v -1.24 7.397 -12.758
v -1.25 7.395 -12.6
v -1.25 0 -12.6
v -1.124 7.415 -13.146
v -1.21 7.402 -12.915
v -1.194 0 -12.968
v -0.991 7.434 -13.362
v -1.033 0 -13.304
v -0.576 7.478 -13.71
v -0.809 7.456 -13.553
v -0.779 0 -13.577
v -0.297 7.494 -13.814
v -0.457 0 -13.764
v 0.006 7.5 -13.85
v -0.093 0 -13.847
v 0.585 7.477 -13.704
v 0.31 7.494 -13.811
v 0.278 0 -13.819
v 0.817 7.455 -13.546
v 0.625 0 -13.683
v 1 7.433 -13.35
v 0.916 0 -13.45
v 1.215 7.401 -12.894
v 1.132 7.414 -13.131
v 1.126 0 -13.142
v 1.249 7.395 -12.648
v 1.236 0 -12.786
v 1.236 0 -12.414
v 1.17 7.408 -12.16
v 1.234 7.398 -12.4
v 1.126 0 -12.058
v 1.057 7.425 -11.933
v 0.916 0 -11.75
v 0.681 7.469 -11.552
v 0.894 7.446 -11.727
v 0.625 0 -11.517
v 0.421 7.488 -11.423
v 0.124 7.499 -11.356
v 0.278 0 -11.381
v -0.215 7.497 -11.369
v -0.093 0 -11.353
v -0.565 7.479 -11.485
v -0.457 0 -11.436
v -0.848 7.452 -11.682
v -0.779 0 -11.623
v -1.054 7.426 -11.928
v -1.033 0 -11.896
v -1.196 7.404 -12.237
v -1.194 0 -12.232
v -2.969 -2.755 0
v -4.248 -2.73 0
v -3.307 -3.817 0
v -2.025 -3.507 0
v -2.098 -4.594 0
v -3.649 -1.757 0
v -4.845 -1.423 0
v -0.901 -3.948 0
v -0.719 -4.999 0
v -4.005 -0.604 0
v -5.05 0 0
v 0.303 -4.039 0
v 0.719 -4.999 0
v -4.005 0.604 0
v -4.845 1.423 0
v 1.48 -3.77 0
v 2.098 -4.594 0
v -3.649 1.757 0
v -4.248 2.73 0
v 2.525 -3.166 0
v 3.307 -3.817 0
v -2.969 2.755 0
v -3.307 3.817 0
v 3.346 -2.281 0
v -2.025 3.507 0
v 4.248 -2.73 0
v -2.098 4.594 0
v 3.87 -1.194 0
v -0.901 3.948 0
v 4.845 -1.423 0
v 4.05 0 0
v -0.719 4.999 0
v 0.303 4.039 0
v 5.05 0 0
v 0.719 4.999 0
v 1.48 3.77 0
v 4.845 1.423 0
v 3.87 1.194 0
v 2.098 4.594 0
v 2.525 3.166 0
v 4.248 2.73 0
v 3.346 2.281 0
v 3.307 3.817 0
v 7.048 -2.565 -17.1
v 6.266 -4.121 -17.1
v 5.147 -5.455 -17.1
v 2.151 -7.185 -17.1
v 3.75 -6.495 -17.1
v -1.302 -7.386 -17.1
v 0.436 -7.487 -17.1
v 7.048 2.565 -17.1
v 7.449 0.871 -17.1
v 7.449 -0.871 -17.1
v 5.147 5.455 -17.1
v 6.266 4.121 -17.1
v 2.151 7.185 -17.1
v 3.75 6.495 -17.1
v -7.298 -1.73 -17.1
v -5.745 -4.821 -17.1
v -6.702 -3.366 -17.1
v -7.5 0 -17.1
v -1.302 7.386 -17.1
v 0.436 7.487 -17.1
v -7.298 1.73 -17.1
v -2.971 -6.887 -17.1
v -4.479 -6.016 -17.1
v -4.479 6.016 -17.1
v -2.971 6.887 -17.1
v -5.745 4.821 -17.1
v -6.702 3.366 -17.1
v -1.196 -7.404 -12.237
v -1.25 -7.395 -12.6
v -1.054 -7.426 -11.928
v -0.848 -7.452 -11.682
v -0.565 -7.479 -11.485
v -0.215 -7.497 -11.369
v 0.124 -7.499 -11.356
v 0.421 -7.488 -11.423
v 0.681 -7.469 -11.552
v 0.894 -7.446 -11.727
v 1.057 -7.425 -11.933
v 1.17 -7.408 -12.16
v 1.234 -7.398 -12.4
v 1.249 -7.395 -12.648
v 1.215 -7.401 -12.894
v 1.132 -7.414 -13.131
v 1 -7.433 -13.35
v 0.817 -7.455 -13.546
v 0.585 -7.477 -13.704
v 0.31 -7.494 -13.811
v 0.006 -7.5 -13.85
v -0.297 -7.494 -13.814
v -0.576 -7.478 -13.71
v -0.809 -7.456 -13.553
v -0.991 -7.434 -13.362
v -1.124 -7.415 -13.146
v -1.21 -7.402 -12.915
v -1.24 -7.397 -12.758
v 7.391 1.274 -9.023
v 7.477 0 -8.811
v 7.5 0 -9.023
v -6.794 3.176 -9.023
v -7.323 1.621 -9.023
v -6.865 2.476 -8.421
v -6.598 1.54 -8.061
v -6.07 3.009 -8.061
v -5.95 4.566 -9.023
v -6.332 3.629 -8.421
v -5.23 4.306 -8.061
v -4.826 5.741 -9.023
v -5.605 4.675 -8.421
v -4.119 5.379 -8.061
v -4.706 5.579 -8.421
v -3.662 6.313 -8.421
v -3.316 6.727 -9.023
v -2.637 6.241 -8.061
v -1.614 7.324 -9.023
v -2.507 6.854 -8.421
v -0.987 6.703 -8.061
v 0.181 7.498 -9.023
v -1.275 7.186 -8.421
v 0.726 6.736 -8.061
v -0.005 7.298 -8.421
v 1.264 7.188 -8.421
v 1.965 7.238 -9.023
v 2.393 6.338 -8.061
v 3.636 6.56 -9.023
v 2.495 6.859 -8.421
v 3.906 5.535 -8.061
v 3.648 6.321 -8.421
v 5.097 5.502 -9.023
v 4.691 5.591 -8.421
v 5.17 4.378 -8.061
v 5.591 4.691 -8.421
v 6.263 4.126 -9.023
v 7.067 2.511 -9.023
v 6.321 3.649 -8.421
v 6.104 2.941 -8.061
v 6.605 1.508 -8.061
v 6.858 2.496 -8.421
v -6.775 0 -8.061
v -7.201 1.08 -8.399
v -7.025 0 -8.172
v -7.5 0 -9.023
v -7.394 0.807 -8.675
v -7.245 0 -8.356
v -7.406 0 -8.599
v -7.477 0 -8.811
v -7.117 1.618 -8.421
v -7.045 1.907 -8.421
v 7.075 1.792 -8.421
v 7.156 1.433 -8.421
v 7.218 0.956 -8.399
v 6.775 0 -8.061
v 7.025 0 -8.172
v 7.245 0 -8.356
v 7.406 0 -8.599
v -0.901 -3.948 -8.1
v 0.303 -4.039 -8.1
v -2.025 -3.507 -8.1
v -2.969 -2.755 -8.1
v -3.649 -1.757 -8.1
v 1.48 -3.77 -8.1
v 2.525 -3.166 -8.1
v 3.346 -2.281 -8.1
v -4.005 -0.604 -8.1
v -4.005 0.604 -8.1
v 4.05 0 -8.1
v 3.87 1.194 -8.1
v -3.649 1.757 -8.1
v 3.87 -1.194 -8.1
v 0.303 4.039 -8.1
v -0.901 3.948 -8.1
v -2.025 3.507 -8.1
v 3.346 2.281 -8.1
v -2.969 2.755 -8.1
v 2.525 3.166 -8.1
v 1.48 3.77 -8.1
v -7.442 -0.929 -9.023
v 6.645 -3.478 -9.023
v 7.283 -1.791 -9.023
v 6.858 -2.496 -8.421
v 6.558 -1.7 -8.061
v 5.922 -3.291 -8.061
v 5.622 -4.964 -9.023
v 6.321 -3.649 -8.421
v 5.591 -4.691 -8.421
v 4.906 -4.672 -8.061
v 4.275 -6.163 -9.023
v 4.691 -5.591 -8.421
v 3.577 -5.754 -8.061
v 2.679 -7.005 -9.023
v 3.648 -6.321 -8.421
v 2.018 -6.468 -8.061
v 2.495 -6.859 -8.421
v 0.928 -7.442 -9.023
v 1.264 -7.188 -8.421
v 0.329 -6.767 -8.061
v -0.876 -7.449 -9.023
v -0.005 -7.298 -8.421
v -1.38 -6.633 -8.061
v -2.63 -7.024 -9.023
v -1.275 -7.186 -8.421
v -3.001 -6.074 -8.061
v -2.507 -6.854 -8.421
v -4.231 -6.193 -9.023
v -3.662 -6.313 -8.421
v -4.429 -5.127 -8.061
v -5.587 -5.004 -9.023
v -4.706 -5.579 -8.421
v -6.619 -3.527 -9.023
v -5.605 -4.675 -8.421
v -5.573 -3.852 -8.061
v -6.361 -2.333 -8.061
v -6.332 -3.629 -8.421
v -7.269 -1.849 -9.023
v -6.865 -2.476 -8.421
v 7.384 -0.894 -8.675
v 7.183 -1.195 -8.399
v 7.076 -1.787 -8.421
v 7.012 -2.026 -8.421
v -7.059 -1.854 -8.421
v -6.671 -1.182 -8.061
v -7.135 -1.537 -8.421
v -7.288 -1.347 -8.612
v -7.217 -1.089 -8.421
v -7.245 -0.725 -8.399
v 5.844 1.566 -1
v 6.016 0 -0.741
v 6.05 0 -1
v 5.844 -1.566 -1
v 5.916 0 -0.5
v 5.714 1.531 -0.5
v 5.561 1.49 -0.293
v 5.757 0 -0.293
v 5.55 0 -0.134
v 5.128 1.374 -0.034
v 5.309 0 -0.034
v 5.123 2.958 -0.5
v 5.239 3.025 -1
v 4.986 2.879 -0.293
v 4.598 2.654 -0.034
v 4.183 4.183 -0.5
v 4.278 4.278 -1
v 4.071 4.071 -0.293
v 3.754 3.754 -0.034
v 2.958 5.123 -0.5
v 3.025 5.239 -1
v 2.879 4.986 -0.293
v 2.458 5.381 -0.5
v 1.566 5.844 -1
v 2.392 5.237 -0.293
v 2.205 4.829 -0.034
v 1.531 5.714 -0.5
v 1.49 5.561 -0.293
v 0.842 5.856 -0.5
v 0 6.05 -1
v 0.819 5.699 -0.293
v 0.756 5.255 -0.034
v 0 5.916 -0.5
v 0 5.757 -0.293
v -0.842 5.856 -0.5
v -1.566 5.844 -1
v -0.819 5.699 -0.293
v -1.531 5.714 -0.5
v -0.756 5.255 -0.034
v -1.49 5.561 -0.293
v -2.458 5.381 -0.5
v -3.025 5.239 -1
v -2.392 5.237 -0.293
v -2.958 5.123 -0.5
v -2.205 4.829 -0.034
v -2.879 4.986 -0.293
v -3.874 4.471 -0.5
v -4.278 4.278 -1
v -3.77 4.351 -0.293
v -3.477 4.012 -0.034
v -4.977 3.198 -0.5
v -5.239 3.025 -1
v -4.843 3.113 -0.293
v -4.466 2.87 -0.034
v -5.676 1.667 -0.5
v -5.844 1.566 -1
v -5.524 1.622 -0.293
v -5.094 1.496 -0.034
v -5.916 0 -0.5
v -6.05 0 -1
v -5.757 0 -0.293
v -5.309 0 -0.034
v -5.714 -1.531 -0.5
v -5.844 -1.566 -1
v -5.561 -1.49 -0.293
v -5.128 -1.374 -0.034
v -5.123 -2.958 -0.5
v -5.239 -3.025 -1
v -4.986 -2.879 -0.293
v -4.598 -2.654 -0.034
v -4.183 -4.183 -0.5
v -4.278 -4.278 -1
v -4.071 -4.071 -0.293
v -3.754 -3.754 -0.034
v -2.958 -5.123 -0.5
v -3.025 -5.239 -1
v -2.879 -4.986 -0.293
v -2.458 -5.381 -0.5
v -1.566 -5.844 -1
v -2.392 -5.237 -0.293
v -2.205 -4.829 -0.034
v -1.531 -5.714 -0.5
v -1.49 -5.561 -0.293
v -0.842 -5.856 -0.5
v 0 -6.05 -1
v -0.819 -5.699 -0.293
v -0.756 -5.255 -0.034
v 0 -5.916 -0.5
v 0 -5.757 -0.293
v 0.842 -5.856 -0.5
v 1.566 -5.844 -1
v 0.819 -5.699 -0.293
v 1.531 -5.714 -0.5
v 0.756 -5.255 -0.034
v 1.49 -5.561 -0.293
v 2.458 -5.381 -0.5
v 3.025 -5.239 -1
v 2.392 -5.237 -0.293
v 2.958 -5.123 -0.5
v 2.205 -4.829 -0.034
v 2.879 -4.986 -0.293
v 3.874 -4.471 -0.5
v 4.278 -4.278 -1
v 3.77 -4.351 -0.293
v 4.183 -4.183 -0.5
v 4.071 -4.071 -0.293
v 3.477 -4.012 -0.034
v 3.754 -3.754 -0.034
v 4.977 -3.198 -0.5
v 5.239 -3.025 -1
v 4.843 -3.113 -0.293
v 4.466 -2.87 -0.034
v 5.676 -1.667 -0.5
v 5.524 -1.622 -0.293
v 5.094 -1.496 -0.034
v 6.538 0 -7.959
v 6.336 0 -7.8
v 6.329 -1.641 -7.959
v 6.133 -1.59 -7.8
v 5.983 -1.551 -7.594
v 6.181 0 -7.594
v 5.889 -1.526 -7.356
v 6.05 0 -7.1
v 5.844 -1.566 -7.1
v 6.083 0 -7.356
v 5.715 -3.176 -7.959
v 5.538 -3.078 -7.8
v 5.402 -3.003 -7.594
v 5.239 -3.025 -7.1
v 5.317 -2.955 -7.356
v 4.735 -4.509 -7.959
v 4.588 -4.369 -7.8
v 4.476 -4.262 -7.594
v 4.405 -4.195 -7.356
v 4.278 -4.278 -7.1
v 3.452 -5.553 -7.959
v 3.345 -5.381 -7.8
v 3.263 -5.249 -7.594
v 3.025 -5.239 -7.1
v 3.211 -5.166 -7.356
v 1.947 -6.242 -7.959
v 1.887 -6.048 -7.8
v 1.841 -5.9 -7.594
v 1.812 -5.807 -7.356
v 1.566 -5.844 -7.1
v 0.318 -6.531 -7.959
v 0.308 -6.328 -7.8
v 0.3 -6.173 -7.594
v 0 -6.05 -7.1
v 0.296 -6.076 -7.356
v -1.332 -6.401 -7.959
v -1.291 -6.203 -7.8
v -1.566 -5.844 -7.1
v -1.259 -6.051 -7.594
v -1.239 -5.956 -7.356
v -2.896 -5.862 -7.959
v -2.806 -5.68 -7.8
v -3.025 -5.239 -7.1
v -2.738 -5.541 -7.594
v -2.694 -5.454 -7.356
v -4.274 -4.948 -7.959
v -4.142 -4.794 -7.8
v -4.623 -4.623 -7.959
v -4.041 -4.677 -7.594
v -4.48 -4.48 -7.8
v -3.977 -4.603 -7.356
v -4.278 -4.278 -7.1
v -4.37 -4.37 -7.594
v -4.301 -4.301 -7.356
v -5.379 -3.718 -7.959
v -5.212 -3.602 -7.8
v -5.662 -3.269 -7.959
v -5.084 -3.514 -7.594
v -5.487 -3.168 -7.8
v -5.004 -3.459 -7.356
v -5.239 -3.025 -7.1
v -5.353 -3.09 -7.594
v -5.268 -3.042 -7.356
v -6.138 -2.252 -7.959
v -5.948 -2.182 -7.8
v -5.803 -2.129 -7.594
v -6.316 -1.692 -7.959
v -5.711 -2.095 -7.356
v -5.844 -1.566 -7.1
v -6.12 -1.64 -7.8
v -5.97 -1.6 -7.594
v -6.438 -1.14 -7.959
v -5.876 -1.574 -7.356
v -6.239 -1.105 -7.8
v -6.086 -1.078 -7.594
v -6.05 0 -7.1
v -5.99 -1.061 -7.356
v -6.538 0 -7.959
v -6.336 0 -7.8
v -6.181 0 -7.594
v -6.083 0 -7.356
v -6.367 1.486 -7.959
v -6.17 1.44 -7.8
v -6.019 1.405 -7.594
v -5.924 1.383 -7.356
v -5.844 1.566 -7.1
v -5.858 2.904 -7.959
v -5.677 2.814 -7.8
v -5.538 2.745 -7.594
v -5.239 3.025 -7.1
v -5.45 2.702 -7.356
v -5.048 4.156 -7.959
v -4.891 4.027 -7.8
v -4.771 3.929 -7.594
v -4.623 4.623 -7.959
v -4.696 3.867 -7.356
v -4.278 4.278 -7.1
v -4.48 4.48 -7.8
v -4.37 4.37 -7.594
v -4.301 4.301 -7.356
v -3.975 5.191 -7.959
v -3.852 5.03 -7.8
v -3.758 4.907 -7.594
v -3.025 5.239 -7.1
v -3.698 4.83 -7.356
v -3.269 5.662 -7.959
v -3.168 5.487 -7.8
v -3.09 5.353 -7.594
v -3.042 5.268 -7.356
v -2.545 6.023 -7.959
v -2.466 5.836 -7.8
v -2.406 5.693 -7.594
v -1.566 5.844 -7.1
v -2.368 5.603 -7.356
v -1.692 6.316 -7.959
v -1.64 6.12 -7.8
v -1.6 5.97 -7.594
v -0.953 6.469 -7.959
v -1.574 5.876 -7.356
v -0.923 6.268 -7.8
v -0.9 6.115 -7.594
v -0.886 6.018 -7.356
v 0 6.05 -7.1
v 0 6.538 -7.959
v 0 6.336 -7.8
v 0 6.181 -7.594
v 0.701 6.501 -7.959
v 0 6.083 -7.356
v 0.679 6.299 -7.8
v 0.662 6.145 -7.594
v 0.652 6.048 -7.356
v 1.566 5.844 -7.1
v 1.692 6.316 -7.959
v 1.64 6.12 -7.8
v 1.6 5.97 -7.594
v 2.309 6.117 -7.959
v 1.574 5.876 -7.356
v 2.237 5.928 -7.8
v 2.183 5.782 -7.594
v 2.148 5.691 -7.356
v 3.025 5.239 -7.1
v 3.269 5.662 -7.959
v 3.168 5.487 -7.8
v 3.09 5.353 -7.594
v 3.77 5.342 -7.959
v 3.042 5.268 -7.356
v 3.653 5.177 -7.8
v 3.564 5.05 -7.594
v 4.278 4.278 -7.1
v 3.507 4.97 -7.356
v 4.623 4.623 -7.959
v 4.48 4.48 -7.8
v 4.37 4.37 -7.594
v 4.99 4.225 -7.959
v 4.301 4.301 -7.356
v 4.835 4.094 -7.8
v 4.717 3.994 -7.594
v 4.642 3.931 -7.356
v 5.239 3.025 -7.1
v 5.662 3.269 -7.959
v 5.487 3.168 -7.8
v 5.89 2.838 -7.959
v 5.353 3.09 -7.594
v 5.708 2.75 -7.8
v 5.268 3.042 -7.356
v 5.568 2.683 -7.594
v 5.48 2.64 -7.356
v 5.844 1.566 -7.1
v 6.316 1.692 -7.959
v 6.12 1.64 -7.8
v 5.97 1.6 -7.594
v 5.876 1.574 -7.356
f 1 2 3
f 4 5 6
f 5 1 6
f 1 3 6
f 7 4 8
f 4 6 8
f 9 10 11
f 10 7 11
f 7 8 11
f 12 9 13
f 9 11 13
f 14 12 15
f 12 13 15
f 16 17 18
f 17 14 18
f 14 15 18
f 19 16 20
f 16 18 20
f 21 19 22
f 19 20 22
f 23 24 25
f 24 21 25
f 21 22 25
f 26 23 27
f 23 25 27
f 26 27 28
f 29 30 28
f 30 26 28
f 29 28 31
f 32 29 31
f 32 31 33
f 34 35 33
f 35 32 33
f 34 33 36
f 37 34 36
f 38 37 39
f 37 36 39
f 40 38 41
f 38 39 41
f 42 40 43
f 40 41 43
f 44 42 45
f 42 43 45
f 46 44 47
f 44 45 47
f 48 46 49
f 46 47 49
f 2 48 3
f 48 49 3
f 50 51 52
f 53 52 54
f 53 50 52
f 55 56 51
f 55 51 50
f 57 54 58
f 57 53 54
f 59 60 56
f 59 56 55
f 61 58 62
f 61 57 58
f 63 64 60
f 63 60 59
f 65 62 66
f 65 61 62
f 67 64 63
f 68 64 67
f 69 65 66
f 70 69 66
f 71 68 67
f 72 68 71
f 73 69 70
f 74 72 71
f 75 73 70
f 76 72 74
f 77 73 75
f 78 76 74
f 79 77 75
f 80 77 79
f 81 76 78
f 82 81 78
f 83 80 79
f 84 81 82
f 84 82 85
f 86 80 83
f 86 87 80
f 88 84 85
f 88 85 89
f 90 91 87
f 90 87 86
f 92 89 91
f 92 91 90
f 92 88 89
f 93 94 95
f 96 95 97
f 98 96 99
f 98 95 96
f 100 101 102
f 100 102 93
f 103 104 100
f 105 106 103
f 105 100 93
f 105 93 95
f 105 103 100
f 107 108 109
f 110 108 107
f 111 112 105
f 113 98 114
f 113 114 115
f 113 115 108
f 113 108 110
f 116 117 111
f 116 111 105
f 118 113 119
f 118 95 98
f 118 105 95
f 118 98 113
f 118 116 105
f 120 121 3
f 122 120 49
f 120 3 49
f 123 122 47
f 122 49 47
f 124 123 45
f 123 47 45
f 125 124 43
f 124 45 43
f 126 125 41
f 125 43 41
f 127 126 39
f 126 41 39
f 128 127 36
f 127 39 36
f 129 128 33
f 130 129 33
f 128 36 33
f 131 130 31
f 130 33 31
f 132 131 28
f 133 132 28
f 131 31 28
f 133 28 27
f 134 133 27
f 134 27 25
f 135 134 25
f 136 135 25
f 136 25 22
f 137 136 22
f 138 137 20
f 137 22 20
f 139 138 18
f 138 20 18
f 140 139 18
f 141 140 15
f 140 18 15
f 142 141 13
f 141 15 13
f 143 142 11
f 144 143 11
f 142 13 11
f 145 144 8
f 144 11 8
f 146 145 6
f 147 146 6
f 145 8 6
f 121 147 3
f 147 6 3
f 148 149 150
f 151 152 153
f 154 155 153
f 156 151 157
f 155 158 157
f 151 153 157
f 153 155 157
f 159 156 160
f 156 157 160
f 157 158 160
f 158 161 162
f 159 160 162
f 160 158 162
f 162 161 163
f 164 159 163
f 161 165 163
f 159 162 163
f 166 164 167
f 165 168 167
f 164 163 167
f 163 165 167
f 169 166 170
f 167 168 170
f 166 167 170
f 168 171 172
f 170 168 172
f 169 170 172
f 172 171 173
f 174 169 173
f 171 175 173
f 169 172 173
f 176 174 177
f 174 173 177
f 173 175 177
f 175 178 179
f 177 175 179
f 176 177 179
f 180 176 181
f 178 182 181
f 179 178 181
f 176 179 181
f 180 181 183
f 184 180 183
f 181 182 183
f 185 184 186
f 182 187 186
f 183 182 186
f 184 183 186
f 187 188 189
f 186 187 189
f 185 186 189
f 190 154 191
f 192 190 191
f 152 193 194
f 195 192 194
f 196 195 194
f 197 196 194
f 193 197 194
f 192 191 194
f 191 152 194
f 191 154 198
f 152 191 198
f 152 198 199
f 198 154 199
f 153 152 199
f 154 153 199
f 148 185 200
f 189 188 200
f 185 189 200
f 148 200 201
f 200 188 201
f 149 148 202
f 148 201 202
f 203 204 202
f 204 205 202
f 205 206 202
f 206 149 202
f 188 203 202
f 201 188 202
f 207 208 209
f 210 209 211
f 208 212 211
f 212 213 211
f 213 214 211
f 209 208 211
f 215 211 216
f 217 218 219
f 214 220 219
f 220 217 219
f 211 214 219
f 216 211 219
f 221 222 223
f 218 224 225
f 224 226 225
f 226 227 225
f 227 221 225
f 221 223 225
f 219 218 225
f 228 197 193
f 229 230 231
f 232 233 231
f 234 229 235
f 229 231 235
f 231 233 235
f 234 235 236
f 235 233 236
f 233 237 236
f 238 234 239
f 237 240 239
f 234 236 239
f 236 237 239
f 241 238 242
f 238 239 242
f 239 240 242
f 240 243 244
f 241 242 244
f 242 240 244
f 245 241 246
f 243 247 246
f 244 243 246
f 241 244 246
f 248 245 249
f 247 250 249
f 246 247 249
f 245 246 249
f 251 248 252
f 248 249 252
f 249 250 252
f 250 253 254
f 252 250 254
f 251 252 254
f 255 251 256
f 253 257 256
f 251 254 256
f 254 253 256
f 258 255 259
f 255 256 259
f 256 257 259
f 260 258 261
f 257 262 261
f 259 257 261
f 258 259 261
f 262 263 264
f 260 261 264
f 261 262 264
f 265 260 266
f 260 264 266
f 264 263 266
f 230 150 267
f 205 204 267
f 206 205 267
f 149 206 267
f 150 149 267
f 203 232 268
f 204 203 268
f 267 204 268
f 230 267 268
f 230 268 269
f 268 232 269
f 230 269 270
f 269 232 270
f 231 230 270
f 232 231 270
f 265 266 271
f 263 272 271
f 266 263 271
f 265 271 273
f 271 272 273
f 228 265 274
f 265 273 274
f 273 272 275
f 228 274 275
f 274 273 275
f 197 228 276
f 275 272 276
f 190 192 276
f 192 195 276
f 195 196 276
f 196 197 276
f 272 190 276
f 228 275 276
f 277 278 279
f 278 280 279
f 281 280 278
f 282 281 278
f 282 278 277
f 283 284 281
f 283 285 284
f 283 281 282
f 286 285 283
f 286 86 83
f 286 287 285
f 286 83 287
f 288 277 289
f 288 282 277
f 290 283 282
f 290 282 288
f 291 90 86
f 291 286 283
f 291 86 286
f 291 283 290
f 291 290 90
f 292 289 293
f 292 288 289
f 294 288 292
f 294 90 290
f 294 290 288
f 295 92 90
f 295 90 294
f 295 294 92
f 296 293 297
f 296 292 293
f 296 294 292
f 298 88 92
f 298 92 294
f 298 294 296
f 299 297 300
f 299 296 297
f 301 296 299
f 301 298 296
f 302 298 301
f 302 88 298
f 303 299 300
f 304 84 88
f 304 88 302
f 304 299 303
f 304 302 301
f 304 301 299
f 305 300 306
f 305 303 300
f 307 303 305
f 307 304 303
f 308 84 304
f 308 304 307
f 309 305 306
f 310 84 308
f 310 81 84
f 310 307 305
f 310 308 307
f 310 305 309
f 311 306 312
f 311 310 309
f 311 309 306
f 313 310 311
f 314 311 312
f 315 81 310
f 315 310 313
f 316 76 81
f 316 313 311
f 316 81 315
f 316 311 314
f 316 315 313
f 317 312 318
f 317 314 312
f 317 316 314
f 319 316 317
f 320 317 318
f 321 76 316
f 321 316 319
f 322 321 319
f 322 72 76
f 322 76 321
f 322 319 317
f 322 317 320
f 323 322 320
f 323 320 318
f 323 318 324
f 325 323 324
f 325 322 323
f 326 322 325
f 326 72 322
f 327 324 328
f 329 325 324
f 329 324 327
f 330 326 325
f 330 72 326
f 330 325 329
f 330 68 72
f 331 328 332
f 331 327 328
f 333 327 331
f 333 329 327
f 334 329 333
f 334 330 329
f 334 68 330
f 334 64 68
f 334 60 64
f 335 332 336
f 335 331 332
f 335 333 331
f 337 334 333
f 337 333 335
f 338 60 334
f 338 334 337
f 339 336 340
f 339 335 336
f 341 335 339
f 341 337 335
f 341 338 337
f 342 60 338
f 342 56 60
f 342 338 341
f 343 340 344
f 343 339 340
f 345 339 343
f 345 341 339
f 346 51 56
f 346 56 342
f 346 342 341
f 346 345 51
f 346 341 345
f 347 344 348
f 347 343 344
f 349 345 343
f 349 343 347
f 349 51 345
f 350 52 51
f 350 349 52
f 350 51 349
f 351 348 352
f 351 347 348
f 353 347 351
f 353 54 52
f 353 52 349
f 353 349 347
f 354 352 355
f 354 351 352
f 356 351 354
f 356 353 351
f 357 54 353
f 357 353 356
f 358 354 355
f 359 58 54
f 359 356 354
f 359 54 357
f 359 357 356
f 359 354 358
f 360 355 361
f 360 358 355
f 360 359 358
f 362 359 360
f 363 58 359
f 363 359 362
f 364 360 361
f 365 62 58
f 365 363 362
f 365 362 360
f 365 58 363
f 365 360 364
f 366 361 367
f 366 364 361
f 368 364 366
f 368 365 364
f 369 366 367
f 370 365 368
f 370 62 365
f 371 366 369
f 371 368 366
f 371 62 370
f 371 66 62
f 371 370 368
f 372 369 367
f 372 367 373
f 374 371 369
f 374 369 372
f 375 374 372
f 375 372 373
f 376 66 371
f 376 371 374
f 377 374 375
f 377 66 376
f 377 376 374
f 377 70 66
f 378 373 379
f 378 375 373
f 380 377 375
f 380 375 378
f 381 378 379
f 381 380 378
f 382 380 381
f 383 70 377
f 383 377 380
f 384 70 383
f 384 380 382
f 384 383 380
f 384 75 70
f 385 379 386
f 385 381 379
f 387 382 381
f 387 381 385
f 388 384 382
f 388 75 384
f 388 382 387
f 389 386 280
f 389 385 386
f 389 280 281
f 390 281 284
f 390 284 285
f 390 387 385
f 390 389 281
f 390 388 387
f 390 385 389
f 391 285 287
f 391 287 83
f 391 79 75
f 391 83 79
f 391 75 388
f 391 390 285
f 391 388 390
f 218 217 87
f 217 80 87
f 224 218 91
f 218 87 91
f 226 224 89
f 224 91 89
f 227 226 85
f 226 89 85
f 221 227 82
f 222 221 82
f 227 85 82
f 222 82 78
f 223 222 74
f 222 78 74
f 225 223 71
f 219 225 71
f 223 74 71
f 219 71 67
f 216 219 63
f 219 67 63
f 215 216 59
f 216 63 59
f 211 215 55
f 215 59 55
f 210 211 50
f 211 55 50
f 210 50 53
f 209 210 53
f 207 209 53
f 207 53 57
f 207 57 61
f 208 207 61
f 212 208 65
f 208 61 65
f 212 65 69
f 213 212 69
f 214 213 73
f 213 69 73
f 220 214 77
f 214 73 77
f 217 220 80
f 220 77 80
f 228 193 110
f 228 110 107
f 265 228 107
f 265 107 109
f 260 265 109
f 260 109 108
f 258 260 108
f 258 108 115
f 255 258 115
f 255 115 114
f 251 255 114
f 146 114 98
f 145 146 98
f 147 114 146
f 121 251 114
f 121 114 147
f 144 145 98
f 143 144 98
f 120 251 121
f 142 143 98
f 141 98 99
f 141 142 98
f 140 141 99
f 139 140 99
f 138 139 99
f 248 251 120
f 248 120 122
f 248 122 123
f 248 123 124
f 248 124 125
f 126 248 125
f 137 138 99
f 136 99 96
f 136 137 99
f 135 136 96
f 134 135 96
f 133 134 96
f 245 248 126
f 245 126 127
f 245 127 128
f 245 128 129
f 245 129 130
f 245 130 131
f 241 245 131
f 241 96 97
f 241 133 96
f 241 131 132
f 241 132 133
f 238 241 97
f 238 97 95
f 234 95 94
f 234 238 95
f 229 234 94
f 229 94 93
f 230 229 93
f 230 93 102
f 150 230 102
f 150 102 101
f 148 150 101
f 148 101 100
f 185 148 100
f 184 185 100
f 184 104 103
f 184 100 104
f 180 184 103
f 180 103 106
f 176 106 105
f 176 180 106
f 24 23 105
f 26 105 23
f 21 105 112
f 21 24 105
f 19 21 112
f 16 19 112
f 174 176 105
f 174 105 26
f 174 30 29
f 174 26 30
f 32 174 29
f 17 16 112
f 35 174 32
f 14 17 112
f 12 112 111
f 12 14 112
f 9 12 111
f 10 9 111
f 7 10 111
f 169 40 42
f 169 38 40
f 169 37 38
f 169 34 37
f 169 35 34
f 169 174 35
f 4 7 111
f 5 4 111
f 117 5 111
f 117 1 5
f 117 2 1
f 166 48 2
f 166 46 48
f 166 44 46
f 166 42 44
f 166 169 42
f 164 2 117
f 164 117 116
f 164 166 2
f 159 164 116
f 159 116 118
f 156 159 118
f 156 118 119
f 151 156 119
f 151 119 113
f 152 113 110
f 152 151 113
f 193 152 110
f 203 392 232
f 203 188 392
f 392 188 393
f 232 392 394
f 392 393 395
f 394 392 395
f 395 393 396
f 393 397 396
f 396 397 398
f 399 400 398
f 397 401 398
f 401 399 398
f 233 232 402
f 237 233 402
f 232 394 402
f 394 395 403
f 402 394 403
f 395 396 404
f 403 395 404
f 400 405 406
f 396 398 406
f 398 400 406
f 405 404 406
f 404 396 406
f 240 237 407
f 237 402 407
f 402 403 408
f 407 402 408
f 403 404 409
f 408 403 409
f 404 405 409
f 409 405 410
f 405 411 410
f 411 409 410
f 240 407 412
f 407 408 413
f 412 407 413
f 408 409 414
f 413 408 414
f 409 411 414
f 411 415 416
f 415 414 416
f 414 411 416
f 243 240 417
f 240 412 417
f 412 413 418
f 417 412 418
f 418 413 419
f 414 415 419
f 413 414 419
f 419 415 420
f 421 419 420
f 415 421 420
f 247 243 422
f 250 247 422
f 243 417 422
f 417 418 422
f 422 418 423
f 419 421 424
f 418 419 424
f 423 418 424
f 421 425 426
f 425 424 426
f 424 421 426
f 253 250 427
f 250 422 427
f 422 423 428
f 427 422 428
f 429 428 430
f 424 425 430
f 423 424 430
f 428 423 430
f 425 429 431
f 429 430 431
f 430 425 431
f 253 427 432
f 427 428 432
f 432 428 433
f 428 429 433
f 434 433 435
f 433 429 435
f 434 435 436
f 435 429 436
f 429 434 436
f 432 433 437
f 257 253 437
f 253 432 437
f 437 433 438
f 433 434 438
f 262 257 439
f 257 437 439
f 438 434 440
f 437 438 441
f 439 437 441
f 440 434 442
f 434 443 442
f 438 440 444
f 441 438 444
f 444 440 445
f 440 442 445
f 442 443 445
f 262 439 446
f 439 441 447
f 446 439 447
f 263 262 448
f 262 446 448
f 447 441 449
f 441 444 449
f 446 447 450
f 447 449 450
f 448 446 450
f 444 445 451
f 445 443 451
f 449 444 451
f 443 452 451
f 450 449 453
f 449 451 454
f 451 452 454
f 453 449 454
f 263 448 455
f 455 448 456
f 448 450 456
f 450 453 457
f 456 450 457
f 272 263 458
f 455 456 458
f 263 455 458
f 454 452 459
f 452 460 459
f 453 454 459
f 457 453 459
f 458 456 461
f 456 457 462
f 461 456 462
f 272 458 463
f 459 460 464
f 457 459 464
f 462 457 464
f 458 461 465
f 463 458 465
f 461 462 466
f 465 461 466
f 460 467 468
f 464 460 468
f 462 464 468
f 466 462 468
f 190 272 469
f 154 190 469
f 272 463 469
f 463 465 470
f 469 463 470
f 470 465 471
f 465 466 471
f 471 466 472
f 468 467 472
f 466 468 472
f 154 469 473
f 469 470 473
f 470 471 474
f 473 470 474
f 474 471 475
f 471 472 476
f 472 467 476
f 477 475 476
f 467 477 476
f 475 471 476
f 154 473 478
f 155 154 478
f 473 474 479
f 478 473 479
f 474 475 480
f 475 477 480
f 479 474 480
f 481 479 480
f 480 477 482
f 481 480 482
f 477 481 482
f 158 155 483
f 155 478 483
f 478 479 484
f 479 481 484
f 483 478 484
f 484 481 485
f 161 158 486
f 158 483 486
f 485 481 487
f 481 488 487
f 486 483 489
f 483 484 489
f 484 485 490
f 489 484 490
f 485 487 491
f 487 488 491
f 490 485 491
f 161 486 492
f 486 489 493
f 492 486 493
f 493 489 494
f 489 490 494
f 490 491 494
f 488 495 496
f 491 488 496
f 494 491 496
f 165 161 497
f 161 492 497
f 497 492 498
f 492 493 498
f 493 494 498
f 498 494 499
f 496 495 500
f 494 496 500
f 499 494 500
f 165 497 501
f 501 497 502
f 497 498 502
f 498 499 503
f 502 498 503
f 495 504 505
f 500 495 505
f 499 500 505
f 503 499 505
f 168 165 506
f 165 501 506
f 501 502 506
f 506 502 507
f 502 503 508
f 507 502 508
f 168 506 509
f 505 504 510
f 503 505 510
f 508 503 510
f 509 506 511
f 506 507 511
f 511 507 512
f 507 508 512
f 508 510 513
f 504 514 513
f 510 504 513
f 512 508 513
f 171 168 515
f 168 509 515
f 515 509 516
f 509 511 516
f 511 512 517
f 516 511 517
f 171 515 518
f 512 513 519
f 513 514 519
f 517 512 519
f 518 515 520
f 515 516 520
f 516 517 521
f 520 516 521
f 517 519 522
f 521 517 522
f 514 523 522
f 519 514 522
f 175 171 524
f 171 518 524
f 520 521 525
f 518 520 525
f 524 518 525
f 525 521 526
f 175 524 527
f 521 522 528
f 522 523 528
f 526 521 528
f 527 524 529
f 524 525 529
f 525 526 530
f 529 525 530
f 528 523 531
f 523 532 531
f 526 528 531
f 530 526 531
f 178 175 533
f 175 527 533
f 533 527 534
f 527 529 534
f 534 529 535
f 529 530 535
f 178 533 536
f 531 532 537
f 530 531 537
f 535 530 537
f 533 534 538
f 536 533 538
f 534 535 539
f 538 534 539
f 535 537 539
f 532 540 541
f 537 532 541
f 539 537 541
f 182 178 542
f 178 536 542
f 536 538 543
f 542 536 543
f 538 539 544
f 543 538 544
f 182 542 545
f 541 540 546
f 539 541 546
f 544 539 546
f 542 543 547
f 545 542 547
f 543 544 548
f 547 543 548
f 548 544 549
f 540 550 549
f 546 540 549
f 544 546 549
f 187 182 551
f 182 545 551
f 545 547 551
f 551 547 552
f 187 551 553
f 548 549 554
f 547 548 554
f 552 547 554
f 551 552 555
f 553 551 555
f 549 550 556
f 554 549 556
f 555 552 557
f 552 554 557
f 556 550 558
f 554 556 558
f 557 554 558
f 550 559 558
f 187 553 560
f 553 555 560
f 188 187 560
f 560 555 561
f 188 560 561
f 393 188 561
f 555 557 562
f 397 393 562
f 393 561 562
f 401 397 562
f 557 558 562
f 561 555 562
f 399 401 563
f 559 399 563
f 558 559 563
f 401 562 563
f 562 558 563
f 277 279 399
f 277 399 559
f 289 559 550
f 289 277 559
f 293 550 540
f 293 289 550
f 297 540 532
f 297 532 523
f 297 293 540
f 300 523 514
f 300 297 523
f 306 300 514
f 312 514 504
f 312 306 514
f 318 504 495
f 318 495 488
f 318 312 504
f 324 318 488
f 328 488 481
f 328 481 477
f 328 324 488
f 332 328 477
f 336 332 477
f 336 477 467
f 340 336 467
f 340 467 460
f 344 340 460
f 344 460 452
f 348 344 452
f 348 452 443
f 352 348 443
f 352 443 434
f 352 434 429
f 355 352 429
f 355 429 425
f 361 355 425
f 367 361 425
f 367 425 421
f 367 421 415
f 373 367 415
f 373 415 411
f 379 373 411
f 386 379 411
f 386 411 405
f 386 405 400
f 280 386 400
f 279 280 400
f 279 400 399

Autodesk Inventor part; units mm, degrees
ref_plane "YZ Plane" through (0, 0, 0) normal (1, 0, 0) x (0, 1, 0)
ref_plane "XZ Plane" through (0, 0, 0) normal (0, 1, 0) x (-1, 0, 0)
ref_plane "XY Plane" through (0, 0, 0) normal (0, 0, 1) x (1, 0, 0)
sketch "スケッチ1" plane through (0, 0, 0) normal (0, 0, 1) x (1, 0, 0)
  circle A0 centre (0, 0) radius 4.05
  circle A1 centre (0, 0) radius 6.05
  dimension "d0" = 8.1
  dimension "d1" = 2
extrude "押し出し1" add sketch "スケッチ1" against normal blind 8.1
sketch "スケッチ2" plane through (0, 0, -8.1) normal (0, 0, -1) x (-1, 0, 0)
  circle A0 centre (0, 0) radius 7.5
  circle A1 centre (0, 0) radius 7.5
  dimension "d10" = 15
extrude "押し出し2" add sketch "スケッチ2" along normal blind 9
sketch "スケッチ3" plane through (0, 0, 0) normal (0, 1, 0) x (-1, 0, 0)
  circle A0 centre (0, -12.6) radius 1.25
  line L0 (4.05, -8.1) -> (-4.05, -8.1) projected
  point P0 (0, 0)
  dimension "d6" = 2.5
  dimension "d7" = 4.5
extrude "押し出し3" cut sketch "スケッチ3" along normal through all both and the other way through all
fillet "フィレット1" radius 1 2 edges at (-6.05, 0, -8.1) (7.5, 0, -8.1)
fillet "フィレット2" radius 1 1 edges at (-6.05, 0, 0)
properties part number "parent_ver."
